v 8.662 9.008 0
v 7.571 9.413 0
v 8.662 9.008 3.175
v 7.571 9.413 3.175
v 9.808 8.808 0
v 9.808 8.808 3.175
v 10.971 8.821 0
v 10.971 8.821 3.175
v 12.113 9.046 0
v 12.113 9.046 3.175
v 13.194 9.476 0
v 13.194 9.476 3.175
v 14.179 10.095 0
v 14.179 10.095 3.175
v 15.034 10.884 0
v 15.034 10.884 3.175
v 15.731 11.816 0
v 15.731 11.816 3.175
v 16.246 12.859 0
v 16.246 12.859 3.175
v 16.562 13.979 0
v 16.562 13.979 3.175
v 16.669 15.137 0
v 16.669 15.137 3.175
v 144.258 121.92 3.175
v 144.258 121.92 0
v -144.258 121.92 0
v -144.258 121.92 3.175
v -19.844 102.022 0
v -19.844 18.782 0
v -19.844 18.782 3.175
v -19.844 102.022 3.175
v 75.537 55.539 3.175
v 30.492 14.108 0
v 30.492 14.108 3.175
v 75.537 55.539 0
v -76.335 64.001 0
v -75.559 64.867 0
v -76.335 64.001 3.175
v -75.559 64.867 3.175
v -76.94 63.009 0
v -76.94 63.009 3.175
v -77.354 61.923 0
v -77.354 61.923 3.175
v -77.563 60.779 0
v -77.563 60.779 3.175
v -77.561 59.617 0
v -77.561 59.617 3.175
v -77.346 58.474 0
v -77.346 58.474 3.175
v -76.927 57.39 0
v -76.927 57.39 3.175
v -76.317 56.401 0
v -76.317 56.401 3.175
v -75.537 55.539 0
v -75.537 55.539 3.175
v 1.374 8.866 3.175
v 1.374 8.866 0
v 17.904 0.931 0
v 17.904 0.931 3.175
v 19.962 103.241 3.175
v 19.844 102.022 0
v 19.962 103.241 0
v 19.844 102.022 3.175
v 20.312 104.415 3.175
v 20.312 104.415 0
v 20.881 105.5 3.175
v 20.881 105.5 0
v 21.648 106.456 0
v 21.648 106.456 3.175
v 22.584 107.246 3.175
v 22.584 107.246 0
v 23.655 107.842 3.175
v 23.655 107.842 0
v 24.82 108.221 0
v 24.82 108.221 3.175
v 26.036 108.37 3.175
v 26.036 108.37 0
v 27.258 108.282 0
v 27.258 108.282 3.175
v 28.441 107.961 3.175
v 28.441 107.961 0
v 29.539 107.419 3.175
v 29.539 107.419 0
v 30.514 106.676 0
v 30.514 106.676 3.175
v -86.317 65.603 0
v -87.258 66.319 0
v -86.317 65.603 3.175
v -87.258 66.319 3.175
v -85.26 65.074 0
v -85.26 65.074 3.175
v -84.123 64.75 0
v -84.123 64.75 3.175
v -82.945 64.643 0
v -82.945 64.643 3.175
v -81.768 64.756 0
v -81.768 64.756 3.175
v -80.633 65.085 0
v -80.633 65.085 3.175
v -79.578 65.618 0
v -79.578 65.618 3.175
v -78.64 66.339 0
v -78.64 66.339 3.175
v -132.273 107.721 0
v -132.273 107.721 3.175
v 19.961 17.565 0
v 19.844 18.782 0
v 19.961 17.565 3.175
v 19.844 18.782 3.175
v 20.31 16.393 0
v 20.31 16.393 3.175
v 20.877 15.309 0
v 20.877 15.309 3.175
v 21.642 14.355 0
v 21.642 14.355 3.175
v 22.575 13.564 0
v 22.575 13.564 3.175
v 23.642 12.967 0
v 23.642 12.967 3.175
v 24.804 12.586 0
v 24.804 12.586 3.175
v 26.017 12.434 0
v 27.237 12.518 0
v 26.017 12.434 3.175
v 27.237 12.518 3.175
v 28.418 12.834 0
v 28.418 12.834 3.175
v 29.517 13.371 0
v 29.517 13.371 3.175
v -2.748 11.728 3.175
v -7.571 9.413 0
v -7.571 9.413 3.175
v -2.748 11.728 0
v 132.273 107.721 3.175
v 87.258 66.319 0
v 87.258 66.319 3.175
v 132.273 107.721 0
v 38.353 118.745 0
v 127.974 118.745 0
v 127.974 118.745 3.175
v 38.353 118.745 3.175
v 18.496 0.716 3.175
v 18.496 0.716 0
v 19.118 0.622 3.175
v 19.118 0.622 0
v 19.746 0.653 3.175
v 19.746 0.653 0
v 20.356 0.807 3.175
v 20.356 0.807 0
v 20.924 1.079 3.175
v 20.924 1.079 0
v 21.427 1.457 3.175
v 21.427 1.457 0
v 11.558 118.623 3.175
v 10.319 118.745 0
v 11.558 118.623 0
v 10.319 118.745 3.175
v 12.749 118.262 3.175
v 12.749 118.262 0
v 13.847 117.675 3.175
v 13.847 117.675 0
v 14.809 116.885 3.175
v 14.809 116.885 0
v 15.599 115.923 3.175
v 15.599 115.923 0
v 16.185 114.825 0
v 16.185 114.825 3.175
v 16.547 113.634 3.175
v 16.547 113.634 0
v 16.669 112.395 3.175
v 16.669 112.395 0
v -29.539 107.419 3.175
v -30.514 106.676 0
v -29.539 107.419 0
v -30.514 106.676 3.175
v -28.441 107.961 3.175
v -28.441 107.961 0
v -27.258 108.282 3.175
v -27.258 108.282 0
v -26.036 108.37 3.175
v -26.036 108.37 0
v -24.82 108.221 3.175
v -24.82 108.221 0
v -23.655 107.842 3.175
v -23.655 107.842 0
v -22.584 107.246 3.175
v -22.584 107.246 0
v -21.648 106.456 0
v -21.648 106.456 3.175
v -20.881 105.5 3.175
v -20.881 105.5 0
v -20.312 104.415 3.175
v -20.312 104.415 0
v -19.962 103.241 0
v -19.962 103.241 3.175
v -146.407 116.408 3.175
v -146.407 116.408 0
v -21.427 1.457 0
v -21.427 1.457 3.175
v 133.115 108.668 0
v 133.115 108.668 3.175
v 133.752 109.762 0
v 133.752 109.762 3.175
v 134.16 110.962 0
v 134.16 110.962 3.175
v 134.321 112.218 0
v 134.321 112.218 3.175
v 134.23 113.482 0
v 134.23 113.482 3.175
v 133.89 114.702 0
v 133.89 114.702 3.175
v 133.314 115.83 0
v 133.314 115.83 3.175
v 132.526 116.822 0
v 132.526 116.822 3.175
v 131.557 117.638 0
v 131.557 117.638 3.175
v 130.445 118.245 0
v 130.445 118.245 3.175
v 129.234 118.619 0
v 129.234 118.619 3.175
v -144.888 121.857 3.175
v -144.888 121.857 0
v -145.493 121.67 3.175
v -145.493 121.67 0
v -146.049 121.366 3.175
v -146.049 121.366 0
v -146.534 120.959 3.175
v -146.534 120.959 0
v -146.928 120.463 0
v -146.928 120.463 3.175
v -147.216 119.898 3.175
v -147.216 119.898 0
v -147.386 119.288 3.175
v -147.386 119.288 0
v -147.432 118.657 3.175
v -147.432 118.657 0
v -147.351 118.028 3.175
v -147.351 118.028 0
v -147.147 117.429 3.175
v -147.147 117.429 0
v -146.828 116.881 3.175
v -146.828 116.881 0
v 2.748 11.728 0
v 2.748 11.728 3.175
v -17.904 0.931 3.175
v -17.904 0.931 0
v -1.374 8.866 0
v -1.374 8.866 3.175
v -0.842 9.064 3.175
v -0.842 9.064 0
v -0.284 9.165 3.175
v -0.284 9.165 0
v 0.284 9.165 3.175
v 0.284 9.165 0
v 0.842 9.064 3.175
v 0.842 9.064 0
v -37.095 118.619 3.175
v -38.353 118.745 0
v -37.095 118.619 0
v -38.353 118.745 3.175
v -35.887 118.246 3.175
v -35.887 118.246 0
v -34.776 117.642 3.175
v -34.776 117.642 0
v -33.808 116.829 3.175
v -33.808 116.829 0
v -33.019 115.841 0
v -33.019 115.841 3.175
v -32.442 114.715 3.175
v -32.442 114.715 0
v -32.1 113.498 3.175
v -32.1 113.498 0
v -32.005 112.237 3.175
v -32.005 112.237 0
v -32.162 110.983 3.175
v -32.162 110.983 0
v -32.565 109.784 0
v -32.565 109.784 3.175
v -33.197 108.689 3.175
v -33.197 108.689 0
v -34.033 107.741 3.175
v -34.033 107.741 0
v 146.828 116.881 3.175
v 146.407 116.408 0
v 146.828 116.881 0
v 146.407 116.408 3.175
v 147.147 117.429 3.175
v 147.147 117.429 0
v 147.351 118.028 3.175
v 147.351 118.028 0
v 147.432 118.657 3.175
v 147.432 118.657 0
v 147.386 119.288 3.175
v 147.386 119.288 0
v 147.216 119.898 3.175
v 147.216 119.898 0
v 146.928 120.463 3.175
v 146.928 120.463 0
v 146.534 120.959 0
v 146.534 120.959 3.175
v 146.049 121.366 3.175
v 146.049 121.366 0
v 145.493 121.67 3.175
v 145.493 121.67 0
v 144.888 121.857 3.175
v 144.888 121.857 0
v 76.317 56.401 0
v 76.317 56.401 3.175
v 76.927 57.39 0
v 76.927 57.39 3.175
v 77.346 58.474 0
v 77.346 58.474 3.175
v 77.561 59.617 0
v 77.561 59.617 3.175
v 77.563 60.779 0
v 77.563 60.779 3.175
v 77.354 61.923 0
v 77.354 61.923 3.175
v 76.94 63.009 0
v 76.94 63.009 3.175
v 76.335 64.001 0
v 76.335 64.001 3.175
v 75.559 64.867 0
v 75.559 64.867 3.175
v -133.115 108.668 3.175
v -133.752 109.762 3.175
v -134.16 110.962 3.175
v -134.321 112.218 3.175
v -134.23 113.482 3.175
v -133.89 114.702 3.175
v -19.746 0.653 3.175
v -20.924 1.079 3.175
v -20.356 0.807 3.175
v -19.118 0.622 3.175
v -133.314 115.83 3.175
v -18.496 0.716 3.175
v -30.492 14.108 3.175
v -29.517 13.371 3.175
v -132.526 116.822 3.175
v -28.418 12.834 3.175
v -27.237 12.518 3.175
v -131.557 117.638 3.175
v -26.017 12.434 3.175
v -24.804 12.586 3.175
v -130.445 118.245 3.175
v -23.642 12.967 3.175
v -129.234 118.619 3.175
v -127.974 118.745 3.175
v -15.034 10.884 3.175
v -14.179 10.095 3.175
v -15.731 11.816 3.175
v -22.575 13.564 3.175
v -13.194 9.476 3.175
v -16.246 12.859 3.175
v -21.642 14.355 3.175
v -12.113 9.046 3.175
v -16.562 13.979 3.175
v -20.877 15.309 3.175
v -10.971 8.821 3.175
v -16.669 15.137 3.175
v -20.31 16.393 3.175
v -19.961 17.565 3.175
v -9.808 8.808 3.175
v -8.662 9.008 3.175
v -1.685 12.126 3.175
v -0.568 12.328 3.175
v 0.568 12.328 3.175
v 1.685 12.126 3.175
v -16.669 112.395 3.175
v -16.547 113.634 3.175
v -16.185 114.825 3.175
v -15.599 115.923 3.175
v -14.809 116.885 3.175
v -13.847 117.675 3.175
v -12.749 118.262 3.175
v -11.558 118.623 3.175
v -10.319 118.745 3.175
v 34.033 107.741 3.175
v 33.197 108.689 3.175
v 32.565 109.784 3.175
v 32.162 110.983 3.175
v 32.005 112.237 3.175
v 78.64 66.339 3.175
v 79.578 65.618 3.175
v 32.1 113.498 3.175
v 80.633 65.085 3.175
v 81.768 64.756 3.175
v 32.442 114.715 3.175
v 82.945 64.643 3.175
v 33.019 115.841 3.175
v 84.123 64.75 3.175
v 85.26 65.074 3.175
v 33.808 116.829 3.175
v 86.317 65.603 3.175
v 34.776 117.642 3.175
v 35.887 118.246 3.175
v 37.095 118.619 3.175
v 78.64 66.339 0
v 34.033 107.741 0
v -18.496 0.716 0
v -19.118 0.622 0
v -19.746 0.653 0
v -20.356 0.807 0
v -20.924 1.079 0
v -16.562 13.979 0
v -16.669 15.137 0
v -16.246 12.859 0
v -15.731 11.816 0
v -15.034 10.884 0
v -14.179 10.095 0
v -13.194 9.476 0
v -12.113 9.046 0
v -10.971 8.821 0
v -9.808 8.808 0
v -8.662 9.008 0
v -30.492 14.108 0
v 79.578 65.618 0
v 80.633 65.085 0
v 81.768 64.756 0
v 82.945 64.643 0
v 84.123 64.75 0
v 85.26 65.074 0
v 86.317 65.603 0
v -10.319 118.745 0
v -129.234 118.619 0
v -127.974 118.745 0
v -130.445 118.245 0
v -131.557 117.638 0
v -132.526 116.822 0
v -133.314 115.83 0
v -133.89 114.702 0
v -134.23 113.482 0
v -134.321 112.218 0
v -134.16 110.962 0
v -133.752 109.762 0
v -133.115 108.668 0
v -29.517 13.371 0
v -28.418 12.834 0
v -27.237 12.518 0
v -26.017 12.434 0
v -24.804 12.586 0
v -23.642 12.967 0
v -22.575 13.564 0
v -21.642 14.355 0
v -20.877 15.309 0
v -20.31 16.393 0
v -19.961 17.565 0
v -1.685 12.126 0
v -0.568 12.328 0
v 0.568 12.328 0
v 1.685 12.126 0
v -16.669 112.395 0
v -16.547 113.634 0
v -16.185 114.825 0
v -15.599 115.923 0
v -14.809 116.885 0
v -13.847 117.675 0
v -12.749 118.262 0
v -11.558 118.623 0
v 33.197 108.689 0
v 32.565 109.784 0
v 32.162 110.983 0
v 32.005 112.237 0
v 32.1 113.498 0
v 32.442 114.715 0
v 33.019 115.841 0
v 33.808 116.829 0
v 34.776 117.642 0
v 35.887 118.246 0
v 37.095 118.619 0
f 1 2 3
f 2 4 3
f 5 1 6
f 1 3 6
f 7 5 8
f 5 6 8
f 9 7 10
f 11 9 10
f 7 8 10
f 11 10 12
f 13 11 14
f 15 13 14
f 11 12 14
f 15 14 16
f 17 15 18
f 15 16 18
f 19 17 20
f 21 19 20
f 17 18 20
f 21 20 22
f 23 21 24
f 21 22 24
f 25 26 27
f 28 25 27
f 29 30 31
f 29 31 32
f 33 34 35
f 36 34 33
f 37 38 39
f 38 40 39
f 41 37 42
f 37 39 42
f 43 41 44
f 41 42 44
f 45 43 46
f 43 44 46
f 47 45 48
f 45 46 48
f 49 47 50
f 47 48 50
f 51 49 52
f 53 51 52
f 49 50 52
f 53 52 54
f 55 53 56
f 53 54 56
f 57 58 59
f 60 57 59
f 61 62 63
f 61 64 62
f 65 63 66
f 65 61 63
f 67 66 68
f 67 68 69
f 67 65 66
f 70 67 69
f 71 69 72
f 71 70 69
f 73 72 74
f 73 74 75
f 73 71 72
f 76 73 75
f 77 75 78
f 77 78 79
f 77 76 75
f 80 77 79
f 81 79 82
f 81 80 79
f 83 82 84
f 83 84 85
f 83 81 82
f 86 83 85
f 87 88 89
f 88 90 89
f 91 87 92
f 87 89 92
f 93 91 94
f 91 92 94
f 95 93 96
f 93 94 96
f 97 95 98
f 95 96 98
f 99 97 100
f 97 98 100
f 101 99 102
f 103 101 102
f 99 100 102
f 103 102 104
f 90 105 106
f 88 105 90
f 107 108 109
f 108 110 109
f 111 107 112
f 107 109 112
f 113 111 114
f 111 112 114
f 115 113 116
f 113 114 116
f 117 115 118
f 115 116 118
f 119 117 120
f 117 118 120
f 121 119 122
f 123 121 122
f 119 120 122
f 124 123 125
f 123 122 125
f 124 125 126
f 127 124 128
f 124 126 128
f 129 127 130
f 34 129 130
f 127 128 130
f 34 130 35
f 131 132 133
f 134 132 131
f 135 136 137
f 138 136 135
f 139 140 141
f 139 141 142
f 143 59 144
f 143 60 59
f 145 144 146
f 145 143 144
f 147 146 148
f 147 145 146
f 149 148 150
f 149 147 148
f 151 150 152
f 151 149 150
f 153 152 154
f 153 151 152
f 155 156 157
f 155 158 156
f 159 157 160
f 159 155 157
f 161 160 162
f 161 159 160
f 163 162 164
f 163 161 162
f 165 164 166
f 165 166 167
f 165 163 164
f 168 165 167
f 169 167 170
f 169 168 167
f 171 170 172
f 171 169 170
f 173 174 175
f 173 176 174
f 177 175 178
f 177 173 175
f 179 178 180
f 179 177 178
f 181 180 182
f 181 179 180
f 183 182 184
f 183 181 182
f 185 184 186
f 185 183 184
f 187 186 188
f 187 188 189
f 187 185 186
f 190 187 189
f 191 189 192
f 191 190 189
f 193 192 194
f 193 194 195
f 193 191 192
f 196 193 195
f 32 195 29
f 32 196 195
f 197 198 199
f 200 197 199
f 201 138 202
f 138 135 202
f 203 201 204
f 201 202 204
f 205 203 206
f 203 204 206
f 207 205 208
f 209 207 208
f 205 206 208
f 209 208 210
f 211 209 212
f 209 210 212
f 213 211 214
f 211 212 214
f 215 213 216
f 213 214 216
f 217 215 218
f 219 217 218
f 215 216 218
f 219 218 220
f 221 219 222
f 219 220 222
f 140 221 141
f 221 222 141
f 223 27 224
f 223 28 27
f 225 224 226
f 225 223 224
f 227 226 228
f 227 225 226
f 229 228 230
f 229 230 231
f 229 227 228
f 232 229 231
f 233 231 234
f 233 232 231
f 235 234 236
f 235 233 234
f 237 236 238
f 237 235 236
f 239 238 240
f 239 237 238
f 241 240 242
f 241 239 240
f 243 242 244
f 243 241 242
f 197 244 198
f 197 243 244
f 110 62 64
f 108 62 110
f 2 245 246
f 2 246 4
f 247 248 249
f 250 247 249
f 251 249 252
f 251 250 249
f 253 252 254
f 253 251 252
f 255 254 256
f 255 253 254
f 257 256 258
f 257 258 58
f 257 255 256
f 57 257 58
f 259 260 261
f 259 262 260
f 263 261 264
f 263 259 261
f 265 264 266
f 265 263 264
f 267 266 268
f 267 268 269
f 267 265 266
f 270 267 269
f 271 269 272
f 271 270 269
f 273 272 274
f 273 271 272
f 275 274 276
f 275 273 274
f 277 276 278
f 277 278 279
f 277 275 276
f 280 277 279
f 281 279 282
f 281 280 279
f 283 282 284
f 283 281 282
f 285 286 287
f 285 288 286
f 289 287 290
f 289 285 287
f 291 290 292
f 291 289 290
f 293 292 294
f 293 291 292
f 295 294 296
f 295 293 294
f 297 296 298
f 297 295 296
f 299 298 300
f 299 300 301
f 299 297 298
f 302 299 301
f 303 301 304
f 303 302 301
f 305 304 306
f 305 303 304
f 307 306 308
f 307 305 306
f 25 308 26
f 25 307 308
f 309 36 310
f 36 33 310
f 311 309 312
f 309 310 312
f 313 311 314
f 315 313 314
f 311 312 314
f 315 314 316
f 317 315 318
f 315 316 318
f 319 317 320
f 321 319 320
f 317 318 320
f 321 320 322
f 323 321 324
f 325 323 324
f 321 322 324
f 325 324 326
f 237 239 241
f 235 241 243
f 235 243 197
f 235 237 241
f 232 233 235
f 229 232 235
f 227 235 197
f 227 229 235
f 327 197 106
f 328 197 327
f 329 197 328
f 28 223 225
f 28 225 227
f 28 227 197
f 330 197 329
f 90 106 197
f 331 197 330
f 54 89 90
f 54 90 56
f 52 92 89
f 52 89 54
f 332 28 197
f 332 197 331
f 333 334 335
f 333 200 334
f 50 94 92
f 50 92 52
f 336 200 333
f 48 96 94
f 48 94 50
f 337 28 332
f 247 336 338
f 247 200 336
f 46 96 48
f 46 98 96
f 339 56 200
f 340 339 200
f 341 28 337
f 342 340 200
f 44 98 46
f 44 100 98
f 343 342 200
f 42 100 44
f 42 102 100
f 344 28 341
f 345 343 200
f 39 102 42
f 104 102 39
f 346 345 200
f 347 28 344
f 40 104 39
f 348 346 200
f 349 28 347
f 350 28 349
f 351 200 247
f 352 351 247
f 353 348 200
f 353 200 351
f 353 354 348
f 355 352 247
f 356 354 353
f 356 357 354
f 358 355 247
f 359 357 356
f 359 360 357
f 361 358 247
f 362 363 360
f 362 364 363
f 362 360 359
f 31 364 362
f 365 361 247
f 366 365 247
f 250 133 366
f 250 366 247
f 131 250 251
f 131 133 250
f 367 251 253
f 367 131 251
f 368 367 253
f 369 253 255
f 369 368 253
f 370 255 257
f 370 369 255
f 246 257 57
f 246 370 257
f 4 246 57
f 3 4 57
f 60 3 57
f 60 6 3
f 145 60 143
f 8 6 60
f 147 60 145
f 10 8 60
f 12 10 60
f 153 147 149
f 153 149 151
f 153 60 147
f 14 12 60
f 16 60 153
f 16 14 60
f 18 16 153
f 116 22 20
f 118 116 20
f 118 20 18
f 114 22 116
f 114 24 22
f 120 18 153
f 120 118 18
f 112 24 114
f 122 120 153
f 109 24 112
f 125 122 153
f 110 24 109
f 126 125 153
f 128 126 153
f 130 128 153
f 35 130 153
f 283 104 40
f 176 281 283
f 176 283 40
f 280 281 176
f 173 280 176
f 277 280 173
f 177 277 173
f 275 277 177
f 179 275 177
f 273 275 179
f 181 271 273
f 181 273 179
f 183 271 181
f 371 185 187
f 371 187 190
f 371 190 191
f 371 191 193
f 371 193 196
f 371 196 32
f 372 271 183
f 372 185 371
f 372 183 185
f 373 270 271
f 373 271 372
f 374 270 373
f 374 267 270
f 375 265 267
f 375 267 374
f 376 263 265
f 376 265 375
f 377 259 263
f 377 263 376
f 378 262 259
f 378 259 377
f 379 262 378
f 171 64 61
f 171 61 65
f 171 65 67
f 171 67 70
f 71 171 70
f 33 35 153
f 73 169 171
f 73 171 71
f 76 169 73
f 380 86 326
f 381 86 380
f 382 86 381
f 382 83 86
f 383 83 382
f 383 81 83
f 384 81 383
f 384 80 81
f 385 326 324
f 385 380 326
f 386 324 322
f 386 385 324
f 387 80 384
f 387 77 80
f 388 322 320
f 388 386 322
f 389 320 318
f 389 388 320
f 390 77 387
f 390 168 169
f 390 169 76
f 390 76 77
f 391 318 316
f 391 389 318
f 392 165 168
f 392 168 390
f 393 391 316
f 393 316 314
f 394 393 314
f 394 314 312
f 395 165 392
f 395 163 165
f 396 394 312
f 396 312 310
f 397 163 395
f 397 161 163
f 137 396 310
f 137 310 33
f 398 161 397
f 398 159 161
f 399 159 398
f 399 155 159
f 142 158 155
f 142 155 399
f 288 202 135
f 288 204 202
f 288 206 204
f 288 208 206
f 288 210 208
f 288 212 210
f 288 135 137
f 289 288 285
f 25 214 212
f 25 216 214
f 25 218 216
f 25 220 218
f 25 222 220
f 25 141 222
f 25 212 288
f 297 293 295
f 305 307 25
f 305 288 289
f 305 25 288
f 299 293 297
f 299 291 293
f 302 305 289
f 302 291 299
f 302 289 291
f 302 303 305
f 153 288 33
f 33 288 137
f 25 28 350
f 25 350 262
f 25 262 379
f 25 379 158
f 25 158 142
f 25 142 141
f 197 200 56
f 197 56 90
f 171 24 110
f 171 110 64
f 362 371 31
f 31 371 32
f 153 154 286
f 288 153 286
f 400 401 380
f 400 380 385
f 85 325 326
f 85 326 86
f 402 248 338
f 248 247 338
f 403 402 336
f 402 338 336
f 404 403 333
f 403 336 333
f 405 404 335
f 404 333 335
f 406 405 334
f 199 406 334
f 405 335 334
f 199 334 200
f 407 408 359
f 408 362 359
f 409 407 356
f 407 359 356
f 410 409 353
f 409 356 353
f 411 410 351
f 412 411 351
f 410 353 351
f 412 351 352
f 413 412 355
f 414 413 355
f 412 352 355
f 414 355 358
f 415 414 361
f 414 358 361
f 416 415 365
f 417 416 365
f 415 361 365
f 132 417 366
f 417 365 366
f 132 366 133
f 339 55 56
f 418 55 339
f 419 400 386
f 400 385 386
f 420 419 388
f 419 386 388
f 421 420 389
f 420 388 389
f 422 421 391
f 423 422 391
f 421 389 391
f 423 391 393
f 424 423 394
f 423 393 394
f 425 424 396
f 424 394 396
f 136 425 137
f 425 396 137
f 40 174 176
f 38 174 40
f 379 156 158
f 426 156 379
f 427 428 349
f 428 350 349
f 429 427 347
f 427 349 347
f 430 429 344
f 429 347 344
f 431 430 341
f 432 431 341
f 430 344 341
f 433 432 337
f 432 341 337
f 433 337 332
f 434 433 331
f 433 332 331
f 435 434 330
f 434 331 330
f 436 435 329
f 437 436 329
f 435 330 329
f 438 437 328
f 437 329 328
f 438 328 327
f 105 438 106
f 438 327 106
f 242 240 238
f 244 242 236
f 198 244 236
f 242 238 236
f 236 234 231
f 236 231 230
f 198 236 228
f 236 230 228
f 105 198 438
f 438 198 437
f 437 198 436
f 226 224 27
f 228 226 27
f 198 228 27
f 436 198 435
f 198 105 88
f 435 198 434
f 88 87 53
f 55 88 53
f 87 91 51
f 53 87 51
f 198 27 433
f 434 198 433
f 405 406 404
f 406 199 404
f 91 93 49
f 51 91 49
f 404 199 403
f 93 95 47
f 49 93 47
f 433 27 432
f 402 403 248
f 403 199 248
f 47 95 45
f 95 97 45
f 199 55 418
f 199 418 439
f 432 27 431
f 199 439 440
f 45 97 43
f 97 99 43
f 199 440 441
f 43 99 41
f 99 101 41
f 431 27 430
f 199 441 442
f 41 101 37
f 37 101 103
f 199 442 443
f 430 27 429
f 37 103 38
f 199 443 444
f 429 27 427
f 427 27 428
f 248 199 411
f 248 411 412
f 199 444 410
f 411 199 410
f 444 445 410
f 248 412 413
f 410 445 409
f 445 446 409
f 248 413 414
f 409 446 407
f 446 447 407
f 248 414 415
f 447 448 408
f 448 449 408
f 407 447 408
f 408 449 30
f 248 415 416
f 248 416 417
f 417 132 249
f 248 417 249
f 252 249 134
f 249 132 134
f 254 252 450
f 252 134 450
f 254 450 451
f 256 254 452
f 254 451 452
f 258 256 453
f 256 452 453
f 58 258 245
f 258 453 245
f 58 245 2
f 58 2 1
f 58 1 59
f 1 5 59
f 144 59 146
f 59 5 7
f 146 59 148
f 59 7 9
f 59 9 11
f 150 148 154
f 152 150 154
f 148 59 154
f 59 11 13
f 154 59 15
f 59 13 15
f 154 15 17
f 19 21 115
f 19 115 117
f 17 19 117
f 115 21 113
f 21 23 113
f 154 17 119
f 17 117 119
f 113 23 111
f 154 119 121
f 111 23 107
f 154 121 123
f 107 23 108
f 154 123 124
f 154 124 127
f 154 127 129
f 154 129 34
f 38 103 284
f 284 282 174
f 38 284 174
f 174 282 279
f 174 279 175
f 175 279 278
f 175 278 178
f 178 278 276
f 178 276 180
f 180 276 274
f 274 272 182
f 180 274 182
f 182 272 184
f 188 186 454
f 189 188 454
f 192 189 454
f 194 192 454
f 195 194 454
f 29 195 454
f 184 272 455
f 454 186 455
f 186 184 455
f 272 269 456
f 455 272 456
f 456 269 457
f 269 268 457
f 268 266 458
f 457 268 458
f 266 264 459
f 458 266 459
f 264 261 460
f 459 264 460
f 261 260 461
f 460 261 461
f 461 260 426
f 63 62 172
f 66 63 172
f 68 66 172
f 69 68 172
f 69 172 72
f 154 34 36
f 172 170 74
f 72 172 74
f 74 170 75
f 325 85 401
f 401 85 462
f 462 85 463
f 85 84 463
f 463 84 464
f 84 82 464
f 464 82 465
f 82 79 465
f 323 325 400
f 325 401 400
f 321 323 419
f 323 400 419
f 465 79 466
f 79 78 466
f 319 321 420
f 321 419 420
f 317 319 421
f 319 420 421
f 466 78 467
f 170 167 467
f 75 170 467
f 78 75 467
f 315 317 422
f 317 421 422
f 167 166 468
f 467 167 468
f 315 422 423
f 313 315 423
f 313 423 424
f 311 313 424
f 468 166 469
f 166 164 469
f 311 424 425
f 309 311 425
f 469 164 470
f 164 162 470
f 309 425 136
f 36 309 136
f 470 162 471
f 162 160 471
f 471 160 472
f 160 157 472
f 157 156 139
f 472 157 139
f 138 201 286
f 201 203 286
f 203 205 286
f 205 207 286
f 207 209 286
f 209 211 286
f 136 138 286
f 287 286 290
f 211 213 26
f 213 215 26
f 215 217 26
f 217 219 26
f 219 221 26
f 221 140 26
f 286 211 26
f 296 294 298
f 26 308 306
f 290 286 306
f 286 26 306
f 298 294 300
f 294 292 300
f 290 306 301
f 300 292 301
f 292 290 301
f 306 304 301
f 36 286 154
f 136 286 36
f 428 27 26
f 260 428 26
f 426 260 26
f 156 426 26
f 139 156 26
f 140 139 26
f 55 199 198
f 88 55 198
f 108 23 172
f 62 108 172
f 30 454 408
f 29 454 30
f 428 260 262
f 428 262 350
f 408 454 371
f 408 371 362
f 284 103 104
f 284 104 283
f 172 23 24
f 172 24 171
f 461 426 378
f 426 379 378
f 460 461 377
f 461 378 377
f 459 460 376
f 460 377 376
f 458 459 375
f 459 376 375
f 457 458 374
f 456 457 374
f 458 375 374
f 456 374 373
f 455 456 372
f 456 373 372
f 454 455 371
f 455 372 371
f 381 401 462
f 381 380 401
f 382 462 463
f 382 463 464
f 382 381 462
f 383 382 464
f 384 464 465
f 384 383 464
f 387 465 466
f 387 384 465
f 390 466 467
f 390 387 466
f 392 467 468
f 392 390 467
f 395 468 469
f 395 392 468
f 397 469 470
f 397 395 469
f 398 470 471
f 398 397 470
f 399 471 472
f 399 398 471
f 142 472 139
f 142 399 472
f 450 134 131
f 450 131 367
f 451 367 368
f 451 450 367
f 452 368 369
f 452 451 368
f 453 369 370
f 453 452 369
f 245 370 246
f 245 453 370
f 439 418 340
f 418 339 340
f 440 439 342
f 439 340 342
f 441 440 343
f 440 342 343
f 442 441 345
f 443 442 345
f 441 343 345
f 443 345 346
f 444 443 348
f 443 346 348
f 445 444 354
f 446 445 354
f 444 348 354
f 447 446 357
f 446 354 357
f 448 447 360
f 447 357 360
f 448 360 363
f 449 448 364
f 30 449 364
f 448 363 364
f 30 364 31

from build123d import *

# Parameters (mm, degrees)
BOSS_EXTRUDE1_DEPTH     = 3.175
FILLET1_R               = 3.175
CUT_EXTRUDE1_DEPTH      = 192.340110238
CUT_EXTRUDE1_DEPTH_BACK = 192.340110238
FILLET2_R               = 6.35


with BuildPart() as part:
    # Sketch1 → Boss-Extrude1 (new body)
    with BuildSketch(Plane.XY):
        Polygon((-19.84375, 0), (0, 9.525), (19.84375, 0), (152.4, 121.92), (-152.4, 121.92), align=None)
    extrude(amount=BOSS_EXTRUDE1_DEPTH)

    # Fillet1
    fillet1_edges = [part.edges().sort_by_distance(p)[0] for p in [
        (0, 9.525, 1.5875),
        (-19.84375, 0, 1.5875),
        (-152.4, 121.92, 1.5875),
        (152.4, 121.92, 1.5875),
        (19.84375, 0, 1.5875),
    ]]
    fillet(fillet1_edges, radius=FILLET1_R)

    # Sketch2 → Cut-Extrude1 (cut, two sides: drawn at the far end of the back side and taken through both)
    with BuildSketch(Plane.XY.offset(3.175).offset(-CUT_EXTRUDE1_DEPTH_BACK)):
        Polygon((-82.940049134, 62.347230555), (-22.177311492, 118.745), (-144.257936486, 118.745), align=None)
        Polygon((-19.84375, 4.313748238), (-19.84375, 116.579072853), (-80.595875999, 60.191152749), align=None)
        with BuildLine():
            Line((16.66875, 5.045817854), (16.66875, 118.745))
            Line((16.66875, 118.745), (-16.66875, 118.745))
            Line((-16.66875, 118.745), (-16.66875, 5.045817854))
            Line((-16.66875, 5.045817854), (-2.747842279, 11.72785356))
            ThreePointArc((-2.747842279, 11.72785356), (0, 12.353182146), (2.747842279, 11.72785356))
            Line((2.747842279, 11.72785356), (16.66875, 5.045817854))
        make_face()
        Polygon((80.595875999, 60.191152749), (19.84375, 116.579072853), (19.84375, 4.313748238), align=None)
        Polygon((144.257936486, 118.745), (22.177311492, 118.745), (82.940049134, 62.347230555), align=None)
    extrude(amount=CUT_EXTRUDE1_DEPTH + CUT_EXTRUDE1_DEPTH_BACK, mode=Mode.SUBTRACT)

    # Fillet2
    fillet2_edges = [part.edges().sort_by_distance(p)[0] for p in [
        (-22.177311492, 118.745, 1.5875),
        (-82.940049134, 62.347230555, 1.5875),
        (-144.257936486, 118.745, 1.5875),
        (19.84375, 116.579072853, 1.5875),
        (80.595875999, 60.191152749, 1.5875),
        (19.84375, 4.313748238, 1.5875),
        (22.177311492, 118.745, 1.5875),
        (144.257936486, 118.745, 1.5875),
        (82.940049134, 62.347230555, 1.5875),
        (-16.66875, 5.045817854, 1.5875),
        (-16.66875, 118.745, 1.5875),
        (16.66875, 118.745, 1.5875),
        (16.66875, 5.045817854, 1.5875),
        (-19.84375, 116.579072853, 1.5875),
        (-19.84375, 4.313748238, 1.5875),
        (-80.595875999, 60.191152749, 1.5875),
    ]]
    fillet(fillet2_edges, radius=FILLET2_R)


solid = part.part
